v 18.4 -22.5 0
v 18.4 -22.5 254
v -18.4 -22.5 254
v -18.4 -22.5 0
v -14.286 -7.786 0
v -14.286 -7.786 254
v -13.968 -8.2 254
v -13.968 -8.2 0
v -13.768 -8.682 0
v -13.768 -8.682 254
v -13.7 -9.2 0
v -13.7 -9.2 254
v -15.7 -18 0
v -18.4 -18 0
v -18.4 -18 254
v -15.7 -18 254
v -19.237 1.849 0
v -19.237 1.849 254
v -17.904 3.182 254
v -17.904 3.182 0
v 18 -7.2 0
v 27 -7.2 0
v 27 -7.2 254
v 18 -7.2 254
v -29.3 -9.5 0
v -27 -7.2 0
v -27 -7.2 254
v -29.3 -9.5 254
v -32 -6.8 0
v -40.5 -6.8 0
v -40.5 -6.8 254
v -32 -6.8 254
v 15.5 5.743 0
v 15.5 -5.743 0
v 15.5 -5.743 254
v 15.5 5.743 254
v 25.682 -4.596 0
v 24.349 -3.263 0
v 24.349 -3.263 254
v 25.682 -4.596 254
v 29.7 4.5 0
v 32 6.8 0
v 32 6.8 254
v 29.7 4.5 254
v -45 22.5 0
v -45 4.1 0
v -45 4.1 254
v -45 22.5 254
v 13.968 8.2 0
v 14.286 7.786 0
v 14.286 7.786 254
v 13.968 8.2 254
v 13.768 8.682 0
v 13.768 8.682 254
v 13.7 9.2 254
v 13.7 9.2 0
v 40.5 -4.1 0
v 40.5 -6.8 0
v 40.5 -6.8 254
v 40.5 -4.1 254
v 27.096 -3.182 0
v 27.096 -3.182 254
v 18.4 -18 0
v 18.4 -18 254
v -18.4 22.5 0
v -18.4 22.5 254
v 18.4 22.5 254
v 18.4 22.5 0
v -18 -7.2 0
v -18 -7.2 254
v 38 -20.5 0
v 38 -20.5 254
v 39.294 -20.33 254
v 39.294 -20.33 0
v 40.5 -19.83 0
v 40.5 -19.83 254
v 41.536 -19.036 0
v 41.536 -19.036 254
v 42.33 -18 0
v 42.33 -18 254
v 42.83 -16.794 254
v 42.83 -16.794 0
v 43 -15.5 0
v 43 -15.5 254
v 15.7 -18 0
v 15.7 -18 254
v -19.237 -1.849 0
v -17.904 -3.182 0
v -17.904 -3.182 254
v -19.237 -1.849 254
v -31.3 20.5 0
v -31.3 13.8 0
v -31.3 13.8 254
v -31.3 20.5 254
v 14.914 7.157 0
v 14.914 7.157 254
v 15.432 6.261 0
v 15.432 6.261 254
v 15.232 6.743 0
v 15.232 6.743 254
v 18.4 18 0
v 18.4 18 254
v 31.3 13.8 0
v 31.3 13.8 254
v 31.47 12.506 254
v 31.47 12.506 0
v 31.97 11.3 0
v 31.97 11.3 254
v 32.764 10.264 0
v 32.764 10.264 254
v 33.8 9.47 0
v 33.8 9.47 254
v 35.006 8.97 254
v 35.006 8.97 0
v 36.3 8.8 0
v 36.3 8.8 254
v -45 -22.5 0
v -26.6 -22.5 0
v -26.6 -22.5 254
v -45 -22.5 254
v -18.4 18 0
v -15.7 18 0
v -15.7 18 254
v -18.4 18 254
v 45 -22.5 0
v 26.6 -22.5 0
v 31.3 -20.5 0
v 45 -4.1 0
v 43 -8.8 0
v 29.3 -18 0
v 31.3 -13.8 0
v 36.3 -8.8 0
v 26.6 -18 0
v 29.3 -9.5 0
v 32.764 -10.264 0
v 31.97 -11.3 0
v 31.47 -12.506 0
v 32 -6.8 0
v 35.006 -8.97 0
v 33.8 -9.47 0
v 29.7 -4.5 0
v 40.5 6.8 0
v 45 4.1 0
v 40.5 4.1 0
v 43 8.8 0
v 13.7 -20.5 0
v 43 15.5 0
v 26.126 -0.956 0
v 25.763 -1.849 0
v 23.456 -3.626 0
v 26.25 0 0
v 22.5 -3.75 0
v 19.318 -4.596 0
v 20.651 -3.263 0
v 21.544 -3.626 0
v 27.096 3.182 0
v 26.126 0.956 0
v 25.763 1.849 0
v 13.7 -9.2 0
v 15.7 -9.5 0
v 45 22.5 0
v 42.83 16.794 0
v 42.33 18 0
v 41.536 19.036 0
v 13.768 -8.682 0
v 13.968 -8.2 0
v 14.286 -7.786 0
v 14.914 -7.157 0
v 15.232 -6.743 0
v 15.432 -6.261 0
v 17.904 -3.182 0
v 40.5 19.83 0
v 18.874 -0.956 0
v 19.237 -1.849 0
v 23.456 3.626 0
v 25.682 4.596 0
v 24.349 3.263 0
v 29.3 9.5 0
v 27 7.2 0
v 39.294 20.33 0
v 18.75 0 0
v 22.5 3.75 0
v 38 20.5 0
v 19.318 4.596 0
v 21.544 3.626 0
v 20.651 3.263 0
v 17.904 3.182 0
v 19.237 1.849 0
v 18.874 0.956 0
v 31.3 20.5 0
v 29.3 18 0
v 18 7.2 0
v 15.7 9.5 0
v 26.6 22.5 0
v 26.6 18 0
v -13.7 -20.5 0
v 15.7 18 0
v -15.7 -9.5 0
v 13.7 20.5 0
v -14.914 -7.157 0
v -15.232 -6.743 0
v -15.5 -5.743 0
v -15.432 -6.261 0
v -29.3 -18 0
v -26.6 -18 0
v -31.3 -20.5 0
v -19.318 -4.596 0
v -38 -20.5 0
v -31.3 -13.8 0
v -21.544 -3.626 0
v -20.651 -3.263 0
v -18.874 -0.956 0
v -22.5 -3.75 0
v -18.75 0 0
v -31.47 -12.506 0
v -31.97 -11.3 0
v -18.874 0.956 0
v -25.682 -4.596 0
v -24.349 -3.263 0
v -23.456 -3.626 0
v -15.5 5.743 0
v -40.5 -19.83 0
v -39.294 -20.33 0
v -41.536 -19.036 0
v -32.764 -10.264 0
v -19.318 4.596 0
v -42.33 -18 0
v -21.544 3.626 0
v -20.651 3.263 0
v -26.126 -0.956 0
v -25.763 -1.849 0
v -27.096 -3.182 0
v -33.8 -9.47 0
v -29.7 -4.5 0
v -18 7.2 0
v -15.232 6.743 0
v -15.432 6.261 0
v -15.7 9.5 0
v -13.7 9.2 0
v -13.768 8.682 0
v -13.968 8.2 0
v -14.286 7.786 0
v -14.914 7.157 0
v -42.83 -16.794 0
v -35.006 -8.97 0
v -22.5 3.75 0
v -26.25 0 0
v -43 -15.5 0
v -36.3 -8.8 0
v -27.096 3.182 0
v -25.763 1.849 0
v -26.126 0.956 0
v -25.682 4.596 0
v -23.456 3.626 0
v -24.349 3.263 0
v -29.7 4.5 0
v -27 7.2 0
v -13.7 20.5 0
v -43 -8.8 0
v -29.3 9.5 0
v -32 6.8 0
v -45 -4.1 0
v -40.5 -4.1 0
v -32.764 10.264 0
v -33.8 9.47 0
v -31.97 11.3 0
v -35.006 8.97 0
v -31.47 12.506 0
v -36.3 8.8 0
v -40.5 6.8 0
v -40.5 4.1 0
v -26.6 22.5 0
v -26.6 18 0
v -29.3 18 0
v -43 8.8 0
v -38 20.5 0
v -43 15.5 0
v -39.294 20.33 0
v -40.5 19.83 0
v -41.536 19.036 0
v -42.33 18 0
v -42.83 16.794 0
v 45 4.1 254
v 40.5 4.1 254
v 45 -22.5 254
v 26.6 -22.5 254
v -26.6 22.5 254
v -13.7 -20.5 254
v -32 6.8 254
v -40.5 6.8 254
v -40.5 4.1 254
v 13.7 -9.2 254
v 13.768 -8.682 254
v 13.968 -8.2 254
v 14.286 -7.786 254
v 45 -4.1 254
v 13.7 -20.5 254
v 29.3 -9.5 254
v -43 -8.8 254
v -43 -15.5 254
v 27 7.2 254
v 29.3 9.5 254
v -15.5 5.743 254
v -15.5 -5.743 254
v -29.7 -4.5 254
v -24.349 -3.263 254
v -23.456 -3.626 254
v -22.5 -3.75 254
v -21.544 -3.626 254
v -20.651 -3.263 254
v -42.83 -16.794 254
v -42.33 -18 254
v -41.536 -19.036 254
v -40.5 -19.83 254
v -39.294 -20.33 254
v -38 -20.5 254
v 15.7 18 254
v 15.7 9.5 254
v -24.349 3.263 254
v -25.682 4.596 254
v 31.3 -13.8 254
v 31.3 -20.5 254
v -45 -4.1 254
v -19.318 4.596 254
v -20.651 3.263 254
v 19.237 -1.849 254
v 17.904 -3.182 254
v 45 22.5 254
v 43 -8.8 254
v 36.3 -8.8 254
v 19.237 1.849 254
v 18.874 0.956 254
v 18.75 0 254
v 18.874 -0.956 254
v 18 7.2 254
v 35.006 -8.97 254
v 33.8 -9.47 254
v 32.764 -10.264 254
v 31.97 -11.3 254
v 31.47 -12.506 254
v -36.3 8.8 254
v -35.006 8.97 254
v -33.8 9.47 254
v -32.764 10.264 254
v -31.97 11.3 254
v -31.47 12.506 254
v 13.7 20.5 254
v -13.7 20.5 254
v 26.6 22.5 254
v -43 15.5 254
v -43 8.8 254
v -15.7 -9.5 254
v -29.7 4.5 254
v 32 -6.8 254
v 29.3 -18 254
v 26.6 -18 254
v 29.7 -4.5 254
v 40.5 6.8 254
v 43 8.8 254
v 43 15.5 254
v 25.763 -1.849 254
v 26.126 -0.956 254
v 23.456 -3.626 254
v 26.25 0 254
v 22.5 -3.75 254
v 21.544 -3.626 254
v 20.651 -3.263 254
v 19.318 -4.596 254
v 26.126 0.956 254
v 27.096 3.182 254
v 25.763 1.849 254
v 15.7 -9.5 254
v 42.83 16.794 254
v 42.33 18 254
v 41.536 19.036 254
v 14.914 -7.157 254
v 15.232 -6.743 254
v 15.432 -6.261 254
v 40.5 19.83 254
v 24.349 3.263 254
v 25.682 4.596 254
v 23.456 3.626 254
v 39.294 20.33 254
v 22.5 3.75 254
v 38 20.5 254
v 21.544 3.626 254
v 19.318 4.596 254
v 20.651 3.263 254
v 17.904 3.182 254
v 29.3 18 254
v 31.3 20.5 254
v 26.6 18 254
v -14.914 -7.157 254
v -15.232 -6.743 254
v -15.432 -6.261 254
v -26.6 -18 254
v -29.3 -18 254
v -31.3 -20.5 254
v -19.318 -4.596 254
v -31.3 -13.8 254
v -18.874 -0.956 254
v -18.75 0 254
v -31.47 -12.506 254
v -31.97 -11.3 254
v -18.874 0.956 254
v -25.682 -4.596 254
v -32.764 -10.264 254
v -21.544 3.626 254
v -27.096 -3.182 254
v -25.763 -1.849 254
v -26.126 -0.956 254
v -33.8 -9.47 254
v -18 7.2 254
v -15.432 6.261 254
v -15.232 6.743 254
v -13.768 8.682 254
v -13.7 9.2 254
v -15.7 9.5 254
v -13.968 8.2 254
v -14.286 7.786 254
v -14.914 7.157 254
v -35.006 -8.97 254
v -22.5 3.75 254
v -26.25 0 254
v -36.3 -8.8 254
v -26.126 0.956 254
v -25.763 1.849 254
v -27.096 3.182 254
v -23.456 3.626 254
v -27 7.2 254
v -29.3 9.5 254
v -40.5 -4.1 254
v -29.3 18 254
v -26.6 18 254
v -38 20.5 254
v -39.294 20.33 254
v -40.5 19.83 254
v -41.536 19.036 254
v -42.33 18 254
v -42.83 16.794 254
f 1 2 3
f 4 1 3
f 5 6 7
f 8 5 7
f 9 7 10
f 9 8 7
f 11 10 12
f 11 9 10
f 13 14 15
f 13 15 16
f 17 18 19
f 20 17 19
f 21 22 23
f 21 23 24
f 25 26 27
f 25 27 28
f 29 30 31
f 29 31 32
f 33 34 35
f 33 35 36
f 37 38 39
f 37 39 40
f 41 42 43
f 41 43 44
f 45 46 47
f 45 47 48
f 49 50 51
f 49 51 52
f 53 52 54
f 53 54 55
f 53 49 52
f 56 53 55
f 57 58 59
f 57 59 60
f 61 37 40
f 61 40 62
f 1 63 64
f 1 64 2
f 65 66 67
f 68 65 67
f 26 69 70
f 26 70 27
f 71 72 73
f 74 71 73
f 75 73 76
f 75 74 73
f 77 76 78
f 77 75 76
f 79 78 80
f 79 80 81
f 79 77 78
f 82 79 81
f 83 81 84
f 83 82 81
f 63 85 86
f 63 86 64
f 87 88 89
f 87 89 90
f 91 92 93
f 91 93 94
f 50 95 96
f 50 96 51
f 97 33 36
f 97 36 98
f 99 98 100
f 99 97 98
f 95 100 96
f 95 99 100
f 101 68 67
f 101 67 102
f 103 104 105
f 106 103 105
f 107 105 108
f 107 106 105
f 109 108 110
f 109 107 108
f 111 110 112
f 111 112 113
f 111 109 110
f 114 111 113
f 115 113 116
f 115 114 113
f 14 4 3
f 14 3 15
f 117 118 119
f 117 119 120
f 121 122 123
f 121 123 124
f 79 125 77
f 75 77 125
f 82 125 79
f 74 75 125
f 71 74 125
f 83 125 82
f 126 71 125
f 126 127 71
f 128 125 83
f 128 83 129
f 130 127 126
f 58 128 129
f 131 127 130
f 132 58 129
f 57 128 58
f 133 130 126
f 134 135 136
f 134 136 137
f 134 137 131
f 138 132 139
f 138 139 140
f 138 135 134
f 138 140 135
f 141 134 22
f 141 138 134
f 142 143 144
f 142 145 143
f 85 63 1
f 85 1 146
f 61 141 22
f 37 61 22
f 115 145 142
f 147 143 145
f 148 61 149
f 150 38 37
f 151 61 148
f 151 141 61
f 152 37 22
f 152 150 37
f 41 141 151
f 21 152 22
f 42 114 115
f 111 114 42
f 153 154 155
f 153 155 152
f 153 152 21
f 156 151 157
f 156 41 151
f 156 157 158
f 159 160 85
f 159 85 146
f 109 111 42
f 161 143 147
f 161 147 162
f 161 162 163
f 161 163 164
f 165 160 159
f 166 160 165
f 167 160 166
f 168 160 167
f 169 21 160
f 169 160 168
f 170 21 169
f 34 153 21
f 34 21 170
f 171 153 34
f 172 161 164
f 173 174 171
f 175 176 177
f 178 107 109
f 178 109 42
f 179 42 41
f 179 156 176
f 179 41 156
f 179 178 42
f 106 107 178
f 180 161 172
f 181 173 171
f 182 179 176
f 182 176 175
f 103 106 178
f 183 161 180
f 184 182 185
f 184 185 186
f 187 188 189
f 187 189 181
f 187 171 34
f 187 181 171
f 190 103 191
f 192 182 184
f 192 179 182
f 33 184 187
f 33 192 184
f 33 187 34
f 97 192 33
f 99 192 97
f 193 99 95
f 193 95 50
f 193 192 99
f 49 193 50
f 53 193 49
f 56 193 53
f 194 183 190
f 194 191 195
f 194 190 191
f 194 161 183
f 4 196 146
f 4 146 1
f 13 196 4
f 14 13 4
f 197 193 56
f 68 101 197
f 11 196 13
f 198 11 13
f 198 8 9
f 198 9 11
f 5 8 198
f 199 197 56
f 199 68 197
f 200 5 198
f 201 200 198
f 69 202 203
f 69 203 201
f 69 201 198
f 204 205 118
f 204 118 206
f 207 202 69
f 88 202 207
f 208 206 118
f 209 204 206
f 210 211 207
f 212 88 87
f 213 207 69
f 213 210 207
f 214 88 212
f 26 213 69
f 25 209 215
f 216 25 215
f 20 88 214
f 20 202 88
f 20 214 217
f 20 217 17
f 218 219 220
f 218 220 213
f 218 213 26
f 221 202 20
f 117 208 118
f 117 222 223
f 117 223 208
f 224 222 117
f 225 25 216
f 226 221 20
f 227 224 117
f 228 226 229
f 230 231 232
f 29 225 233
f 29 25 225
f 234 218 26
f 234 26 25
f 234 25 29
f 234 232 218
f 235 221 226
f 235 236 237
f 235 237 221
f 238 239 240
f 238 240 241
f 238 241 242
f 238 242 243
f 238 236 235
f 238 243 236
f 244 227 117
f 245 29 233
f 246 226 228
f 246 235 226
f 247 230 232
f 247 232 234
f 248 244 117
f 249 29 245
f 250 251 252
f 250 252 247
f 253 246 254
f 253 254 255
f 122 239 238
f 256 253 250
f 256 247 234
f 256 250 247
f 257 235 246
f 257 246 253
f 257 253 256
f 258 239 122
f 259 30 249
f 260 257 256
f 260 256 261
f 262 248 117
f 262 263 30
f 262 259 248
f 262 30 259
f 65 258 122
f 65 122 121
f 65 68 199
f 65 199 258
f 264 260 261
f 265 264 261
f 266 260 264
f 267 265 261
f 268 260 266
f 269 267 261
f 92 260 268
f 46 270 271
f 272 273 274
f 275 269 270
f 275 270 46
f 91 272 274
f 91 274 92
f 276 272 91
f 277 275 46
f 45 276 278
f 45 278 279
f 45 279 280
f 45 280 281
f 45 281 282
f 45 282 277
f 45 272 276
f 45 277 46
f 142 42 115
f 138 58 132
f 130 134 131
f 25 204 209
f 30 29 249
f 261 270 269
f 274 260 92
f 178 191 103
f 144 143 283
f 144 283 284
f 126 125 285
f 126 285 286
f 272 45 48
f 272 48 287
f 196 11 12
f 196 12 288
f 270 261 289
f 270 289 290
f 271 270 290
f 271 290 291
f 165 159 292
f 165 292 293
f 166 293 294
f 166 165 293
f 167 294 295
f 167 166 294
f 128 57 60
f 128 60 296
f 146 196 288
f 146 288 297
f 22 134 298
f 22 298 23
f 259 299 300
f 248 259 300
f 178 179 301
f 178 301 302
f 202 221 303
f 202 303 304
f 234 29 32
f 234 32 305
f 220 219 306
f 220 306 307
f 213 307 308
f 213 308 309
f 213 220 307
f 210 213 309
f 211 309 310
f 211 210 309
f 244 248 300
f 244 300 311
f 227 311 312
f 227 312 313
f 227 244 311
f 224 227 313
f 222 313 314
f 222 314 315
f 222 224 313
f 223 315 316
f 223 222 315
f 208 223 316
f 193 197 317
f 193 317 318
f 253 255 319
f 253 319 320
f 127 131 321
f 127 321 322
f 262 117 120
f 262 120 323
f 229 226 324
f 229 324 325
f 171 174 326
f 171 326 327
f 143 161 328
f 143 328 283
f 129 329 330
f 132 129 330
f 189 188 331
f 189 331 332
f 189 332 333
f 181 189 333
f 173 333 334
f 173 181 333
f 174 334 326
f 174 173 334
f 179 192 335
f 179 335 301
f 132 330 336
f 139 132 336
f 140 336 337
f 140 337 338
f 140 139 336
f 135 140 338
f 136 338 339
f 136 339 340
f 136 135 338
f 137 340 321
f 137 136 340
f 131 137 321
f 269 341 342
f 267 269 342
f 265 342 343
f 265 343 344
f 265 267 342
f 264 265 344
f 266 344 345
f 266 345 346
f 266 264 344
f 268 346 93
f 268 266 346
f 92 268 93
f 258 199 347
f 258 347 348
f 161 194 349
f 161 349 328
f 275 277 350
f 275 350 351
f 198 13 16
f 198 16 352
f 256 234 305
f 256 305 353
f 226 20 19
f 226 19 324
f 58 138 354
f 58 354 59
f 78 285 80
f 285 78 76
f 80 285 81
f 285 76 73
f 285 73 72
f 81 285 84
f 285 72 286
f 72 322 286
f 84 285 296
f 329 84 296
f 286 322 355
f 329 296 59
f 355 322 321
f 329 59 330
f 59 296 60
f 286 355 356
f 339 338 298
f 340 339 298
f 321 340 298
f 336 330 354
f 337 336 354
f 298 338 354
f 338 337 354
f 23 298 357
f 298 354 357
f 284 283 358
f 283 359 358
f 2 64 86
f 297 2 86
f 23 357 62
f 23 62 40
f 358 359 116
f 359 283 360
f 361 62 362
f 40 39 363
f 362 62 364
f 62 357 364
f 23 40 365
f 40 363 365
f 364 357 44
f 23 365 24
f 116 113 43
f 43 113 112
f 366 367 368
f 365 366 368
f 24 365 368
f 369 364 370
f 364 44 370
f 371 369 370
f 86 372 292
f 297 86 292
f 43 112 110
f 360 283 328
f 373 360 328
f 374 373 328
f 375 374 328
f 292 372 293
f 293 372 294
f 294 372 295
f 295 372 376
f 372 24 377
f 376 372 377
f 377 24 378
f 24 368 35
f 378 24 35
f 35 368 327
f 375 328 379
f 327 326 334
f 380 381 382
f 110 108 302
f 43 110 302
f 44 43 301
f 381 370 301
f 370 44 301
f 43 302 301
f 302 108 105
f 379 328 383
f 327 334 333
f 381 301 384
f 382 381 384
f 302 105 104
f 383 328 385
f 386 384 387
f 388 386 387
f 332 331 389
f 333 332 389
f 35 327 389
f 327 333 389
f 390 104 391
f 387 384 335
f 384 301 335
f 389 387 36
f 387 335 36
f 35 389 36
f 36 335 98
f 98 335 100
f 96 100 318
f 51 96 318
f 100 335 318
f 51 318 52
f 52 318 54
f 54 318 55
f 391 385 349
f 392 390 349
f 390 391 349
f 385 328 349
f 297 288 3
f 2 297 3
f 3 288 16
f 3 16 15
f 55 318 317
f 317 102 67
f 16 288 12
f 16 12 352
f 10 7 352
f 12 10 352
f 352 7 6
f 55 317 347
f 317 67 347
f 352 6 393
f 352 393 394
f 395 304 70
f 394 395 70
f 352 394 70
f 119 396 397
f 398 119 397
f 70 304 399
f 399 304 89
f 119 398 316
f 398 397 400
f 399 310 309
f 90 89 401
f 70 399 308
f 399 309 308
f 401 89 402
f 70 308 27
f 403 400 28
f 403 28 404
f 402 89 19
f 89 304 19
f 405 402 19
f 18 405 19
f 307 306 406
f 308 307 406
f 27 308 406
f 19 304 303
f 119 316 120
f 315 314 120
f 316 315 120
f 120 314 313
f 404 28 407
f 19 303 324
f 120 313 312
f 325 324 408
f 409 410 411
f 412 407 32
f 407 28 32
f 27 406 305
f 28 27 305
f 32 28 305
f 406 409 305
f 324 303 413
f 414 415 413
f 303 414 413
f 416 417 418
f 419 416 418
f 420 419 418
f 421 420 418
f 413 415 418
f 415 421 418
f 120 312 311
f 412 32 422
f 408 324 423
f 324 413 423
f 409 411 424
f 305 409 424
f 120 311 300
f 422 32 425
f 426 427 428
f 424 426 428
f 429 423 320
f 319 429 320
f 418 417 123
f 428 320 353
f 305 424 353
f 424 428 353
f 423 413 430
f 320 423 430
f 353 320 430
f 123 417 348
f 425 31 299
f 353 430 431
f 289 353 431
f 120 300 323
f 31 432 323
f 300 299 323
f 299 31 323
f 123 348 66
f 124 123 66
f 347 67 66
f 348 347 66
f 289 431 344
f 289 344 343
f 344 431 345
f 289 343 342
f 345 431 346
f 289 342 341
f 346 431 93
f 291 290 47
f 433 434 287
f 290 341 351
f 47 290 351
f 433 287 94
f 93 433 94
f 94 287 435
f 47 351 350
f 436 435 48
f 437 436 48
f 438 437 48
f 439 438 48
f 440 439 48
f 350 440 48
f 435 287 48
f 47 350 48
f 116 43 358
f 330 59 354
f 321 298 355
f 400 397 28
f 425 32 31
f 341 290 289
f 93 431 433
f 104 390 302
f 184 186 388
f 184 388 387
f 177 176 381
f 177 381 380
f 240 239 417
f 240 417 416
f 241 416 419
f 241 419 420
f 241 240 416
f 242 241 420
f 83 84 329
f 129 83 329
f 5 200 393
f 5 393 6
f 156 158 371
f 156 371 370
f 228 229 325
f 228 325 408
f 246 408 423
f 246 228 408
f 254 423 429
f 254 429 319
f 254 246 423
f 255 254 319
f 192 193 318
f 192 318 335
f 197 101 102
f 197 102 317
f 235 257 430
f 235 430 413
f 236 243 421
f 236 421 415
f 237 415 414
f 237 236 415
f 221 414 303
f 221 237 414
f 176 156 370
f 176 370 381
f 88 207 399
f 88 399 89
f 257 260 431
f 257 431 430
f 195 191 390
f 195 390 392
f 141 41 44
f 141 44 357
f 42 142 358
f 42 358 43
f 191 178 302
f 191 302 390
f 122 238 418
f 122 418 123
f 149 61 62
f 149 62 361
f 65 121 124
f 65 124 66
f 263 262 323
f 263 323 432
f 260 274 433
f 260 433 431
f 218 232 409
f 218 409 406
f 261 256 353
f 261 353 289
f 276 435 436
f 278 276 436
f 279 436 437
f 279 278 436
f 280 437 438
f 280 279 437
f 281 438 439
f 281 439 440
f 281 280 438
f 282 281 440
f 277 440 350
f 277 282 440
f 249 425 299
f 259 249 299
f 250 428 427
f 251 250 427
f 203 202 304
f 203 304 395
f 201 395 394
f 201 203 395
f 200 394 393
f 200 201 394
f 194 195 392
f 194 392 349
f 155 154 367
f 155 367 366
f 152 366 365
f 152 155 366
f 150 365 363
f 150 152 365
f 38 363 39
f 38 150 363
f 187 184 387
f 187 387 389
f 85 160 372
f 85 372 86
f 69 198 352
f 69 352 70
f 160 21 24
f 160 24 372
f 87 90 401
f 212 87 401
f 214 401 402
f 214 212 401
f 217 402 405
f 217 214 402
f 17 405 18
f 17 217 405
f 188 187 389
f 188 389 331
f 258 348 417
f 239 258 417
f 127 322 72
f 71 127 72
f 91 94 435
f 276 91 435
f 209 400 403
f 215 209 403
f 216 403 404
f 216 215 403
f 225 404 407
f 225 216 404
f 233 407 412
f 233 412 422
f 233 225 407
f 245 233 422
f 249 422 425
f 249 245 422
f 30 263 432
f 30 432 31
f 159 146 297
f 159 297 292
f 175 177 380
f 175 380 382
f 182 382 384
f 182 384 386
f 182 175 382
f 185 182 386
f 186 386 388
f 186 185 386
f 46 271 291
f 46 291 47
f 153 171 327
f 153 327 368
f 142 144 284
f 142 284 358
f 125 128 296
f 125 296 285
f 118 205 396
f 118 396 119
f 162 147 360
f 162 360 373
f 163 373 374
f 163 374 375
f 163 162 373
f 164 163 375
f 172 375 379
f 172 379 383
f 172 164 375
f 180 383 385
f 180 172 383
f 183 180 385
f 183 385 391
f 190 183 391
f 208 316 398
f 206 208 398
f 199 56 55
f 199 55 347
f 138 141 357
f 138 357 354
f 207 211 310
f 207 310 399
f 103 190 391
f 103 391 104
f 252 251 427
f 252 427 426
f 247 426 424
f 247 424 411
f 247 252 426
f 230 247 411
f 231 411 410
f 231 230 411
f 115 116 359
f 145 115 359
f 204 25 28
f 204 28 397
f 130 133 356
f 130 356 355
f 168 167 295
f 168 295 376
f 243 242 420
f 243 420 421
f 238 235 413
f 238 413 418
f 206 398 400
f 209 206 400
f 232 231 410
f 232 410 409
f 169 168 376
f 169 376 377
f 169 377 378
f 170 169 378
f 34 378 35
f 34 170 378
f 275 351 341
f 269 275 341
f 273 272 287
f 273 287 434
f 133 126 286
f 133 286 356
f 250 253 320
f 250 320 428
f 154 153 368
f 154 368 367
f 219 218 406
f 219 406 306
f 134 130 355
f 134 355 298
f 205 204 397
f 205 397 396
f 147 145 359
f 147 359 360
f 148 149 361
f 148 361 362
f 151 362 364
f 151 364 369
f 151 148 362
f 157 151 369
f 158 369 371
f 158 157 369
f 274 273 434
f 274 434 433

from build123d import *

# Parameters (mm, degrees)
BOSS_EXTRUDE1_DEPTH = 254


with BuildPart() as part:
    # Sketch1 → Boss-Extrude1 (new body)
    with BuildSketch(Plane(origin=(0, 0, 0), x_dir=(-1, 0, 0), z_dir=(0, 0, -1))):
        Polygon((-26.6, 22.5), (-45, 22.5), (-45, 4.1), (-40.5, 4.1), (-40.5, 6.8), (-32, 6.8), (-29.7, 4.5), (-29.7, -4.5), (-32, -6.8), (-40.5, -6.8), (-40.5, -4.1), (-45, -4.1), (-45, -22.5), (-26.6, -22.5), (-26.6, -18), (-29.3, -18), (-29.3, -9.5), (-27, -7.2), (-18, -7.2), (-15.7, -9.5), (-15.7, -18), (-18.4, -18), (-18.4, -22.5), (18.4, -22.5), (18.4, -18), (15.7, -18), (15.7, -9.5), (18, -7.2), (27, -7.2), (29.3, -9.5), (29.3, -18), (26.6, -18), (26.6, -22.5), (45, -22.5), (45, -4.1), (40.5, -4.1), (40.5, -6.8), (32, -6.8), (29.7, -4.5), (29.7, 4.5), (32, 6.8), (40.5, 6.8), (40.5, 4.1), (45, 4.1), (45, 22.5), (26.6, 22.5), (26.6, 18), (29.3, 18), (29.3, 9.5), (27, 7.2), (18, 7.2), (15.7, 9.5), (15.7, 18), (18.4, 18), (18.4, 22.5), (-18.4, 22.5), (-18.4, 18), (-15.7, 18), (-15.7, 9.5), (-18, 7.2), (-27, 7.2), (-29.3, 9.5), (-29.3, 18), (-26.6, 18), align=None)
        with BuildLine():
            Line((14.914213713, -7.157382523), (14.285798144, -7.785798093))
            ThreePointArc((14.285798144, -7.785798093), (13.852252641, -8.434644791), (13.700011706, -9.200011655))
            Line((13.700011706, -9.200011655), (13.700011706, -20.5))
            Line((13.700011706, -20.5), (-13.700011706, -20.5))
            Line((-13.700011706, -20.5), (-13.700011706, -9.200011568))
            ThreePointArc((-13.700011706, -9.200011568), (-13.852252624, -8.434644744), (-14.285798082, -7.785798067))
            Line((-14.285798082, -7.785798067), (-14.914213624, -7.15738247))
            ThreePointArc((-14.914213624, -7.15738247), (-15.347759082, -6.508535794), (-15.5, -5.74316897))
            Line((-15.5, -5.74316897), (-15.5, 5.7431692))
            ThreePointArc((-15.5, 5.7431692), (-15.347759065, 6.508536064), (-14.914213562, 7.157382762))
            Line((-14.914213562, 7.157382762), (-14.285798144, 7.78579818))
            ThreePointArc((-14.285798144, 7.78579818), (-13.852252641, 8.434644878), (-13.700011706, 9.200011743))
            Line((-13.700011706, 9.200011743), (-13.700011706, 20.5))
            Line((-13.700011706, 20.5), (13.700011706, 20.5))
            Line((13.700011706, 20.5), (13.700011706, 9.200011728))
            ThreePointArc((13.700011706, 9.200011728), (13.852252624, 8.434644904), (14.285798082, 7.785798227))
            Line((14.285798082, 7.785798227), (14.914213775, 7.157382479))
            ThreePointArc((14.914213775, 7.157382479), (15.347759233, 6.508535803), (15.500000151, 5.743168979))
            Line((15.500000151, 5.743168979), (15.500000151, -5.743168961))
            ThreePointArc((15.500000151, -5.743168961), (15.347759216, -6.508535826), (14.914213713, -7.157382523))
        make_face(mode=Mode.SUBTRACT)
        with BuildLine():
            Line((43, 15.5), (43, 8.799988823))
            Line((43, 8.799988823), (36.300017792, 8.799988823))
            ThreePointArc((36.300017792, 8.799988823), (32.764483886, 10.264454917), (31.300017792, 13.799988823))
            Line((31.300017792, 13.799988823), (31.300017792, 20.5))
            Line((31.300017792, 20.5), (38, 20.5))
            ThreePointArc((38, 20.5), (41.535533906, 19.035533906), (43, 15.5))
        make_face(mode=Mode.SUBTRACT)
        with BuildLine():
            Line((-36.300017792, 8.799988823), (-43, 8.799988823))
            Line((-43, 8.799988823), (-43, 15.5))
            ThreePointArc((-43, 15.5), (-41.535533906, 19.035533906), (-38, 20.5))
            Line((-38, 20.5), (-31.300017792, 20.5))
            Line((-31.300017792, 20.5), (-31.300017792, 13.799988823))
            ThreePointArc((-31.300017792, 13.799988823), (-32.764483886, 10.264454917), (-36.300017792, 8.799988823))
        make_face(mode=Mode.SUBTRACT)
        with BuildLine():
            Line((-43, -15.5), (-43, -8.7999878))
            Line((-43, -8.7999878), (-36.300017792, -8.7999878))
            ThreePointArc((-36.300017792, -8.7999878), (-32.764483886, -10.264453894), (-31.300017792, -13.7999878))
            Line((-31.300017792, -13.7999878), (-31.300017792, -20.5))
            Line((-31.300017792, -20.5), (-38, -20.5))
            ThreePointArc((-38, -20.5), (-41.535533906, -19.035533906), (-43, -15.5))
        make_face(mode=Mode.SUBTRACT)
        with BuildLine():
            Line((36.300017792, -8.7999878), (43, -8.7999878))
            Line((43, -8.7999878), (43, -15.5))
            ThreePointArc((43, -15.5), (41.535533906, -19.035533906), (38, -20.5))
            Line((38, -20.5), (31.300017792, -20.5))
            Line((31.300017792, -20.5), (31.300017792, -13.7999878))
            ThreePointArc((31.300017792, -13.7999878), (32.764483886, -10.264453894), (36.300017792, -8.7999878))
        make_face(mode=Mode.SUBTRACT)
        with BuildLine():
            Line((-20.651475745, 3.262737818), (-19.318019484, 4.59619408))
            Line((-19.318019484, 4.59619408), (-17.903805921, 3.181980517))
            Line((-17.903805921, 3.181980517), (-19.237262182, 1.848524255))
            ThreePointArc((-19.237262182, 1.848524255), (-18.750000002, 0), (-19.237262183, -1.848524255))
            Line((-19.237262183, -1.848524255), (-17.903805921, -3.181980517))
            Line((-17.903805921, -3.181980517), (-19.318019483, -4.596194079))
            Line((-19.318019483, -4.596194079), (-20.651475745, -3.262737818))
            ThreePointArc((-20.651475745, -3.262737818), (-22.5, -3.749999998), (-24.348524255, -3.262737818))
            Line((-24.348524255, -3.262737818), (-25.681980515, -4.596194078))
            Line((-25.681980515, -4.596194078), (-27.096194078, -3.181980516))
            Line((-27.096194078, -3.181980516), (-25.762737818, -1.848524255))
            ThreePointArc((-25.762737818, -1.848524255), (-26.249999999, 0), (-25.762737818, 1.848524255))
            Line((-25.762737818, 1.848524255), (-27.096194079, 3.181980517))
            Line((-27.096194079, 3.181980517), (-25.681980517, 4.596194079))
            Line((-25.681980517, 4.596194079), (-24.348524255, 3.262737818))
            ThreePointArc((-24.348524255, 3.262737818), (-22.5, 3.749999999), (-20.651475745, 3.262737818))
        make_face(mode=Mode.SUBTRACT)
        with BuildLine():
            Line((27.096194079, 3.181980516), (25.762737818, 1.848524255))
            ThreePointArc((25.762737818, 1.848524255), (26.249999999, 0), (25.762737818, -1.848524255))
            Line((25.762737818, -1.848524255), (27.09619408, -3.181980517))
            Line((27.09619408, -3.181980517), (25.681980518, -4.596194079))
            Line((25.681980518, -4.596194079), (24.348524256, -3.262737818))
            ThreePointArc((24.348524256, -3.262737818), (22.500000001, -3.749999999), (20.651475745, -3.262737818))
            Line((20.651475745, -3.262737818), (19.318019485, -4.596194078))
            Line((19.318019485, -4.596194078), (17.903805922, -3.181980515))
            Line((17.903805922, -3.181980515), (19.237262182, -1.848524255))
            ThreePointArc((19.237262182, -1.848524255), (18.750000002, 0), (19.237262182, 1.848524255))
            Line((19.237262182, 1.848524255), (17.903805921, 3.181980516))
            Line((17.903805921, 3.181980516), (19.318019483, 4.596194079))
            Line((19.318019483, 4.596194079), (20.651475745, 3.262737817))
            ThreePointArc((20.651475745, 3.262737817), (22.5, 3.749999998), (24.348524255, 3.262737818))
            Line((24.348524255, 3.262737818), (25.681980517, 4.596194079))
            Line((25.681980517, 4.596194079), (27.096194079, 3.181980516))
        make_face(mode=Mode.SUBTRACT)
    extrude(amount=-BOSS_EXTRUDE1_DEPTH)


solid = part.part
